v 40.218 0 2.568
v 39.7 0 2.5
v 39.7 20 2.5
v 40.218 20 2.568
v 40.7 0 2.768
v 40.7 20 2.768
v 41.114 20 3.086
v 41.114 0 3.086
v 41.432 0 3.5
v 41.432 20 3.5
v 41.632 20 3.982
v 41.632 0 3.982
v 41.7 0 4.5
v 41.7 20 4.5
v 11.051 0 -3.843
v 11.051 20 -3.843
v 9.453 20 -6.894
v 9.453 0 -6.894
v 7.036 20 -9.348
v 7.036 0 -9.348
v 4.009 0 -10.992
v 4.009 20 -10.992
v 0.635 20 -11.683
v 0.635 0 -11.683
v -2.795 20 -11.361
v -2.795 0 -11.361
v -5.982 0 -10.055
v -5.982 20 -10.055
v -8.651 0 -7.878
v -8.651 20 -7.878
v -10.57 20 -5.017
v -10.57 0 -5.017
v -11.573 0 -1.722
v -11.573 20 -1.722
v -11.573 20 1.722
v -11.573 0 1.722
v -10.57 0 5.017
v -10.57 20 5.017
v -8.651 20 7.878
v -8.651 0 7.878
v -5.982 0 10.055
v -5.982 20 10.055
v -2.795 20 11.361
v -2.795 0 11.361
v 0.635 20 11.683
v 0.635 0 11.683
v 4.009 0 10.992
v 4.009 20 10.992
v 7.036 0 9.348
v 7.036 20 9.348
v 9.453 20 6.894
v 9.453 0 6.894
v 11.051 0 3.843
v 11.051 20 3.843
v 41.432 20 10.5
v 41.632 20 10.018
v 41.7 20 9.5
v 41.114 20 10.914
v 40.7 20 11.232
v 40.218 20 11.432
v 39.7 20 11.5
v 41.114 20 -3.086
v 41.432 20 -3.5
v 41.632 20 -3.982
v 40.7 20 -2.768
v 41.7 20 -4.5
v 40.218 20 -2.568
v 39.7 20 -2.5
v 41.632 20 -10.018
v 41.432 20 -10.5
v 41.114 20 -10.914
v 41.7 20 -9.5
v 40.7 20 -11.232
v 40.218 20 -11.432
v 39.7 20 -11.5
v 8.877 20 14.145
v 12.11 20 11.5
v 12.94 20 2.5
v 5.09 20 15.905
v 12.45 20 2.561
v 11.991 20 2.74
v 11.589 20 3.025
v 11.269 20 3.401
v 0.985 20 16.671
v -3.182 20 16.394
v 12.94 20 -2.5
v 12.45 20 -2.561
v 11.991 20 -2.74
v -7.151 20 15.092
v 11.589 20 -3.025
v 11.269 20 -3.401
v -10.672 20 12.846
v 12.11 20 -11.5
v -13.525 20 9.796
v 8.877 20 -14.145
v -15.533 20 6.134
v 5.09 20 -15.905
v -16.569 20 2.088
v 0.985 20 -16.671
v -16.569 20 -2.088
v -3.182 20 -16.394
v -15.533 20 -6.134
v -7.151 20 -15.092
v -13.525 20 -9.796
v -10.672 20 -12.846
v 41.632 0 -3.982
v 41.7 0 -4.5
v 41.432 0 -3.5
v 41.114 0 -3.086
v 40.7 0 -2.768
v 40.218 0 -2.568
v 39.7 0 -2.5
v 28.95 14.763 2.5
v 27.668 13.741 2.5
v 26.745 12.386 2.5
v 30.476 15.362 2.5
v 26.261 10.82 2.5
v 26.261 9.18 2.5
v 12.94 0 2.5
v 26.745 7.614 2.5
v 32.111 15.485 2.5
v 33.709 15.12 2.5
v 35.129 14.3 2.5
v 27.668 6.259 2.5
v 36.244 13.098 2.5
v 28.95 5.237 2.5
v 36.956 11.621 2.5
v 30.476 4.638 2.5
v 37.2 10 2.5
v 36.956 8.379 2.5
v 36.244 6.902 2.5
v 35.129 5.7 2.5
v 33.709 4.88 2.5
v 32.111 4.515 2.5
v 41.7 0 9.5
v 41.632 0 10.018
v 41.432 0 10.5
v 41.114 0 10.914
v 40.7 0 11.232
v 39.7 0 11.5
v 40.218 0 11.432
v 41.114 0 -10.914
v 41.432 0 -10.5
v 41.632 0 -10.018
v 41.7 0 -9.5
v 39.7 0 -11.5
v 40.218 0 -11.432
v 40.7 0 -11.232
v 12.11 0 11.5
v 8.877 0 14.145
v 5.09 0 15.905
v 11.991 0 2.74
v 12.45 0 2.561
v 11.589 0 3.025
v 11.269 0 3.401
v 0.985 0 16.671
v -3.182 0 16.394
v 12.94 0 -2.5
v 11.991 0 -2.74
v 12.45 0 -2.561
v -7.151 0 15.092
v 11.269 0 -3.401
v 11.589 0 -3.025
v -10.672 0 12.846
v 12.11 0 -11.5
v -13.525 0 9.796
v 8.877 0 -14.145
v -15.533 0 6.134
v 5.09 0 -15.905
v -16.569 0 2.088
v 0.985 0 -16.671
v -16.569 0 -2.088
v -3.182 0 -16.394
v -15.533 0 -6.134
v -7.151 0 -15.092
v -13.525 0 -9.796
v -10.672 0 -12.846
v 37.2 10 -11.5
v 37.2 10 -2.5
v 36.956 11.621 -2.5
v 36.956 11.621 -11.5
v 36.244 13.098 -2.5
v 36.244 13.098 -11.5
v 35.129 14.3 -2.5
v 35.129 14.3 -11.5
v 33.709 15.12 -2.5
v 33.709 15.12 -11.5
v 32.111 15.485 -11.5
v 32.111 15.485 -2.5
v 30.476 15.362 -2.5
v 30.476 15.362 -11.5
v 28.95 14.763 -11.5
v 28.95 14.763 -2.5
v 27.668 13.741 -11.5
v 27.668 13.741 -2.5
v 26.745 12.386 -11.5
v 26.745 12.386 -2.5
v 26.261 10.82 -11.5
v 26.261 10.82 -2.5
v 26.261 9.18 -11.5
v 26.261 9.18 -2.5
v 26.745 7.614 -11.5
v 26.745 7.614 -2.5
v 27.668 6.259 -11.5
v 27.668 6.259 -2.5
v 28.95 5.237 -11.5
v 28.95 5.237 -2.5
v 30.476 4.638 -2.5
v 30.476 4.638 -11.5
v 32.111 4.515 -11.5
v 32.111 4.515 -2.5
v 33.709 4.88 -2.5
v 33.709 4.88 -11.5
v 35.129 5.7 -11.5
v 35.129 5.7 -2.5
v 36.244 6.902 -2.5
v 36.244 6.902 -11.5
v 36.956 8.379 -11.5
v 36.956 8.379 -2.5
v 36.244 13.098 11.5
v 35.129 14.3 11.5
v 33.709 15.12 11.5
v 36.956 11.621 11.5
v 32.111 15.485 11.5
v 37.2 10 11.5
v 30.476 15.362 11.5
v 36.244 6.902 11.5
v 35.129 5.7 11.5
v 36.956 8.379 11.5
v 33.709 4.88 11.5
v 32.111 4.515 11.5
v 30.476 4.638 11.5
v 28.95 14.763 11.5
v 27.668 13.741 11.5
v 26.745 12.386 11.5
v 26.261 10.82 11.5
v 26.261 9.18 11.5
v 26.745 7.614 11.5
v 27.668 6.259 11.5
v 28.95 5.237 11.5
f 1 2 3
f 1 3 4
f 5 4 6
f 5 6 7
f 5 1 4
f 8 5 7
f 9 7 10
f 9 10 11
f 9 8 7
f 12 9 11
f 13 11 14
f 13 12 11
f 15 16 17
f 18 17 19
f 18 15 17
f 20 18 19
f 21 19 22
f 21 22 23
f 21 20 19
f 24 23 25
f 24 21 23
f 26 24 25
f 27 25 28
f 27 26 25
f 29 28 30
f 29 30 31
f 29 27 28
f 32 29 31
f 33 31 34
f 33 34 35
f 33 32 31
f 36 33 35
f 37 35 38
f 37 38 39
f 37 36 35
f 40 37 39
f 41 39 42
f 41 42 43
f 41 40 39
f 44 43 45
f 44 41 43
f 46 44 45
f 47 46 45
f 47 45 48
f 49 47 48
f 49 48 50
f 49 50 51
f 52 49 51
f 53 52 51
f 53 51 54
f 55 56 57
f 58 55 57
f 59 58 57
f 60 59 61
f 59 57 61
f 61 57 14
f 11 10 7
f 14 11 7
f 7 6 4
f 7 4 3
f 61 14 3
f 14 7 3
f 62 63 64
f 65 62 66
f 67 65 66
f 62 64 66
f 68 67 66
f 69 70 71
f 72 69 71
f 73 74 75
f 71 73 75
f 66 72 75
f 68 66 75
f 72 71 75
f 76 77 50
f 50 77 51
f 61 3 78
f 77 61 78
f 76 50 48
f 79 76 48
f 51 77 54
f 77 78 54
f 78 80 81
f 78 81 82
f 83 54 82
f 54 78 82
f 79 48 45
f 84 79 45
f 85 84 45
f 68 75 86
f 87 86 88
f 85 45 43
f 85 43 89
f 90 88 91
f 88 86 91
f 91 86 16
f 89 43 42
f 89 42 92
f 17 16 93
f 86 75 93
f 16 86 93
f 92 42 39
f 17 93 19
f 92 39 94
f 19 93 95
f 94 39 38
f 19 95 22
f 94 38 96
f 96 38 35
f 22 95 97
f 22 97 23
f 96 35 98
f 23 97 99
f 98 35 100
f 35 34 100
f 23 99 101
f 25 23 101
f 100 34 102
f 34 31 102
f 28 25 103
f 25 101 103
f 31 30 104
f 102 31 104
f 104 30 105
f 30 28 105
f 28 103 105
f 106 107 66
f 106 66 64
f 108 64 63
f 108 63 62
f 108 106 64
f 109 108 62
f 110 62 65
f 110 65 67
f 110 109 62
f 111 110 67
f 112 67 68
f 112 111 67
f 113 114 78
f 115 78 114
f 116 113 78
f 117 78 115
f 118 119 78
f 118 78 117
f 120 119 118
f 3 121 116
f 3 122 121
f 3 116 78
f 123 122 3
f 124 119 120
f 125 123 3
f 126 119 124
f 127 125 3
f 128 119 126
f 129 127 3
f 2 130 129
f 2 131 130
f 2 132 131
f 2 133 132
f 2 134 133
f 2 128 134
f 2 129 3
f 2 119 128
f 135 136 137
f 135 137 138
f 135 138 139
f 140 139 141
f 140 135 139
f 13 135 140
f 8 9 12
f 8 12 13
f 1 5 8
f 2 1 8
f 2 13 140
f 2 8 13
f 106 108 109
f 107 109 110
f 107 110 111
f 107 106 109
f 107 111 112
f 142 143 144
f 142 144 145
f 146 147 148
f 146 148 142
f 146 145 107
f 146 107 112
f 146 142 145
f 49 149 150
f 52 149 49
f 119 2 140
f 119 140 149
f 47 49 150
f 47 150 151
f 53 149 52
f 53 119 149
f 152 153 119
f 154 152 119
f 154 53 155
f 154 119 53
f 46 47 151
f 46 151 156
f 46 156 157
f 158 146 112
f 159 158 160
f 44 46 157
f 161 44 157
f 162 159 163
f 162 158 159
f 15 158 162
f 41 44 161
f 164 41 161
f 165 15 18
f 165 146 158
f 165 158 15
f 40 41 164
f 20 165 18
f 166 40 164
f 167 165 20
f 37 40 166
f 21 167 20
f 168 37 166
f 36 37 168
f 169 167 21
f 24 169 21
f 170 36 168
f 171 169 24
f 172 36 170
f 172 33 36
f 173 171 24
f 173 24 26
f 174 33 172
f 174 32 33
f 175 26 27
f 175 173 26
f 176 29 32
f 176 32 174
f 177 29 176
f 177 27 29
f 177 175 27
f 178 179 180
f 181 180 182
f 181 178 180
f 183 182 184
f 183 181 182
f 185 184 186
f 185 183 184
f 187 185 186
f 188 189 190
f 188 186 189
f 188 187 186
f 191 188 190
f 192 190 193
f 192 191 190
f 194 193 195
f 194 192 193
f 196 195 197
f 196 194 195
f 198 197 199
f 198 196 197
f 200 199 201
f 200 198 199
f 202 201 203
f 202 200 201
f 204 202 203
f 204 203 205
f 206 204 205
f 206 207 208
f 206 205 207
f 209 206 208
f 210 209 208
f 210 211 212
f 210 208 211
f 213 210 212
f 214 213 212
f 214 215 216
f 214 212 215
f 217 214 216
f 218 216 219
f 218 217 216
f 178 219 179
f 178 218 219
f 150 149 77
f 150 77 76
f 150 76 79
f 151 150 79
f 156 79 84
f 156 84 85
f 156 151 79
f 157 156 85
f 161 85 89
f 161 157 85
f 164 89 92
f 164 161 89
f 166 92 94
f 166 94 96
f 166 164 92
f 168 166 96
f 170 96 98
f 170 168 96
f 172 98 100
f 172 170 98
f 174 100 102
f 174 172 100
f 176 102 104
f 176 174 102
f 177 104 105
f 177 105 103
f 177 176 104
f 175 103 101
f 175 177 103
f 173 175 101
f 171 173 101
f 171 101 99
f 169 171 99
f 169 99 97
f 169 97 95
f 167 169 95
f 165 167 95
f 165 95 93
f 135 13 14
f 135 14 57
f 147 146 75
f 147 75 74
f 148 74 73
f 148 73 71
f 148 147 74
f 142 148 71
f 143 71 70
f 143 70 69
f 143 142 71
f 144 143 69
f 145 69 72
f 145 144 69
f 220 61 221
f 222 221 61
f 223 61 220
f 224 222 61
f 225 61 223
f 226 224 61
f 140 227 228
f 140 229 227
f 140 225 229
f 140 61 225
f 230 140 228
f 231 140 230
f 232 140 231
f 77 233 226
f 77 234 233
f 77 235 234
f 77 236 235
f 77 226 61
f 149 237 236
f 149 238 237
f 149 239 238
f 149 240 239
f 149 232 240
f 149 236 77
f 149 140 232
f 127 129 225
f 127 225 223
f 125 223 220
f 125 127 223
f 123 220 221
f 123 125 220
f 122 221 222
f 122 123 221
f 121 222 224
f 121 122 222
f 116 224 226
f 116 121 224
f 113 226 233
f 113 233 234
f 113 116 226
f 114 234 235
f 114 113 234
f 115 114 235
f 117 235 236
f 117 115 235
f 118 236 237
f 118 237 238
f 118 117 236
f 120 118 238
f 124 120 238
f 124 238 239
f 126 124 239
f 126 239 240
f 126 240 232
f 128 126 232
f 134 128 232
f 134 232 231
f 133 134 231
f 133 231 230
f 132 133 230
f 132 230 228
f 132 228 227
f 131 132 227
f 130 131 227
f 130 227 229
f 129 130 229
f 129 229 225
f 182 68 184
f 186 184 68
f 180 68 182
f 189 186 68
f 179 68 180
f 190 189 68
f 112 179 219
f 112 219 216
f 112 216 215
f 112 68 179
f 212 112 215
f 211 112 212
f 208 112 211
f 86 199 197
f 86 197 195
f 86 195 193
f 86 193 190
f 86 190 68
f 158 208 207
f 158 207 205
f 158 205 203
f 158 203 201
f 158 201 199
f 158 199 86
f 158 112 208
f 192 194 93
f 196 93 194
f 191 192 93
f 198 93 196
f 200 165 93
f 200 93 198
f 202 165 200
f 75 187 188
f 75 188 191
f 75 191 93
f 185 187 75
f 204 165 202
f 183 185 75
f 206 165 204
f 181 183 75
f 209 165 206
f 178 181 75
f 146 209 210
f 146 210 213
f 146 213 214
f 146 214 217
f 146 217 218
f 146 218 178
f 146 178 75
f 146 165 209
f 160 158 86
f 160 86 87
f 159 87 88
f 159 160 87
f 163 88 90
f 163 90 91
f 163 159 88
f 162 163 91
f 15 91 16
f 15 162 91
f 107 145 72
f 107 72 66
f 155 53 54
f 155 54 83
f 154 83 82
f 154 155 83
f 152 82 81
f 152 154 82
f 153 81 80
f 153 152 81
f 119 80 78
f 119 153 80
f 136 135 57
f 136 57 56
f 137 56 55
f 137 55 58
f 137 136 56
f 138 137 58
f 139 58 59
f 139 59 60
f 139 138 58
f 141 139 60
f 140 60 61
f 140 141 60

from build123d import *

# Parameters (mm, degrees)
DODANIE_WYCI_GNI_CIE1_DEPTH  = 20
ZAAWANSOWANYOTW_R1_START     = -11.5
ZAAWANSOWANYOTW_R1_OUTLINE_R = 5.5
ZAAWANSOWANYOTW_R1_DEPTH     = 23


# Read off the part's stored shape, not the designer's step: ZaawansowanyOtwór1
with BuildPart() as part:
    # Szkic1 → Dodanie-wyciągnięcie1 (new body)
    with BuildSketch(Plane(origin=(0, 0, 0), x_dir=(1, 0, 0), z_dir=(0, 1, 0))):
        with BuildLine():
            Line((12.109500403, 11.5), (39.7, 11.5))
            ThreePointArc((39.7, 11.5), (41.114213562, 10.914213562), (41.7, 9.5))
            Line((41.7, 9.5), (41.7, 4.5))
            ThreePointArc((41.7, 4.5), (41.114213562, 3.085786438), (39.7, 2.5))
            Line((39.7, 2.5), (13.774977314, 2.5))
            Line((13.774977314, 2.5), (12.939860896, 2.5))
            ThreePointArc((12.939860896, 2.5), (11.780953784, 2.869989477), (11.050830108, 3.843065693))
            ThreePointArc((11.050830108, 3.843065693), (-11.7, 0), (11.050830108, -3.843065693))
            ThreePointArc((11.050830108, -3.843065693), (11.780953784, -2.869989477), (12.939860896, -2.5))
            Line((12.939860896, -2.5), (13.774977314, -2.5))
            Line((13.774977314, -2.5), (39.7, -2.5))
            ThreePointArc((39.7, -2.5), (41.114213562, -3.085786438), (41.7, -4.5))
            Line((41.7, -4.5), (41.7, -9.5))
            ThreePointArc((41.7, -9.5), (41.114213562, -10.914213562), (39.7, -11.5))
            Line((39.7, -11.5), (12.109500403, -11.5))
            ThreePointArc((12.109500403, -11.5), (-16.7, 0), (12.109500403, 11.5))
        make_face()
    extrude(amount=DODANIE_WYCI_GNI_CIE1_DEPTH)

    # ZaawansowanyOtwór1 outline → ZaawansowanyOtwór1 (cut)
    with BuildSketch(Plane.XY.offset(ZAAWANSOWANYOTW_R1_START)):
        with Locations((31.7, 10)):
            Circle(ZAAWANSOWANYOTW_R1_OUTLINE_R)
    extrude(amount=ZAAWANSOWANYOTW_R1_DEPTH, mode=Mode.SUBTRACT)


solid = part.part
